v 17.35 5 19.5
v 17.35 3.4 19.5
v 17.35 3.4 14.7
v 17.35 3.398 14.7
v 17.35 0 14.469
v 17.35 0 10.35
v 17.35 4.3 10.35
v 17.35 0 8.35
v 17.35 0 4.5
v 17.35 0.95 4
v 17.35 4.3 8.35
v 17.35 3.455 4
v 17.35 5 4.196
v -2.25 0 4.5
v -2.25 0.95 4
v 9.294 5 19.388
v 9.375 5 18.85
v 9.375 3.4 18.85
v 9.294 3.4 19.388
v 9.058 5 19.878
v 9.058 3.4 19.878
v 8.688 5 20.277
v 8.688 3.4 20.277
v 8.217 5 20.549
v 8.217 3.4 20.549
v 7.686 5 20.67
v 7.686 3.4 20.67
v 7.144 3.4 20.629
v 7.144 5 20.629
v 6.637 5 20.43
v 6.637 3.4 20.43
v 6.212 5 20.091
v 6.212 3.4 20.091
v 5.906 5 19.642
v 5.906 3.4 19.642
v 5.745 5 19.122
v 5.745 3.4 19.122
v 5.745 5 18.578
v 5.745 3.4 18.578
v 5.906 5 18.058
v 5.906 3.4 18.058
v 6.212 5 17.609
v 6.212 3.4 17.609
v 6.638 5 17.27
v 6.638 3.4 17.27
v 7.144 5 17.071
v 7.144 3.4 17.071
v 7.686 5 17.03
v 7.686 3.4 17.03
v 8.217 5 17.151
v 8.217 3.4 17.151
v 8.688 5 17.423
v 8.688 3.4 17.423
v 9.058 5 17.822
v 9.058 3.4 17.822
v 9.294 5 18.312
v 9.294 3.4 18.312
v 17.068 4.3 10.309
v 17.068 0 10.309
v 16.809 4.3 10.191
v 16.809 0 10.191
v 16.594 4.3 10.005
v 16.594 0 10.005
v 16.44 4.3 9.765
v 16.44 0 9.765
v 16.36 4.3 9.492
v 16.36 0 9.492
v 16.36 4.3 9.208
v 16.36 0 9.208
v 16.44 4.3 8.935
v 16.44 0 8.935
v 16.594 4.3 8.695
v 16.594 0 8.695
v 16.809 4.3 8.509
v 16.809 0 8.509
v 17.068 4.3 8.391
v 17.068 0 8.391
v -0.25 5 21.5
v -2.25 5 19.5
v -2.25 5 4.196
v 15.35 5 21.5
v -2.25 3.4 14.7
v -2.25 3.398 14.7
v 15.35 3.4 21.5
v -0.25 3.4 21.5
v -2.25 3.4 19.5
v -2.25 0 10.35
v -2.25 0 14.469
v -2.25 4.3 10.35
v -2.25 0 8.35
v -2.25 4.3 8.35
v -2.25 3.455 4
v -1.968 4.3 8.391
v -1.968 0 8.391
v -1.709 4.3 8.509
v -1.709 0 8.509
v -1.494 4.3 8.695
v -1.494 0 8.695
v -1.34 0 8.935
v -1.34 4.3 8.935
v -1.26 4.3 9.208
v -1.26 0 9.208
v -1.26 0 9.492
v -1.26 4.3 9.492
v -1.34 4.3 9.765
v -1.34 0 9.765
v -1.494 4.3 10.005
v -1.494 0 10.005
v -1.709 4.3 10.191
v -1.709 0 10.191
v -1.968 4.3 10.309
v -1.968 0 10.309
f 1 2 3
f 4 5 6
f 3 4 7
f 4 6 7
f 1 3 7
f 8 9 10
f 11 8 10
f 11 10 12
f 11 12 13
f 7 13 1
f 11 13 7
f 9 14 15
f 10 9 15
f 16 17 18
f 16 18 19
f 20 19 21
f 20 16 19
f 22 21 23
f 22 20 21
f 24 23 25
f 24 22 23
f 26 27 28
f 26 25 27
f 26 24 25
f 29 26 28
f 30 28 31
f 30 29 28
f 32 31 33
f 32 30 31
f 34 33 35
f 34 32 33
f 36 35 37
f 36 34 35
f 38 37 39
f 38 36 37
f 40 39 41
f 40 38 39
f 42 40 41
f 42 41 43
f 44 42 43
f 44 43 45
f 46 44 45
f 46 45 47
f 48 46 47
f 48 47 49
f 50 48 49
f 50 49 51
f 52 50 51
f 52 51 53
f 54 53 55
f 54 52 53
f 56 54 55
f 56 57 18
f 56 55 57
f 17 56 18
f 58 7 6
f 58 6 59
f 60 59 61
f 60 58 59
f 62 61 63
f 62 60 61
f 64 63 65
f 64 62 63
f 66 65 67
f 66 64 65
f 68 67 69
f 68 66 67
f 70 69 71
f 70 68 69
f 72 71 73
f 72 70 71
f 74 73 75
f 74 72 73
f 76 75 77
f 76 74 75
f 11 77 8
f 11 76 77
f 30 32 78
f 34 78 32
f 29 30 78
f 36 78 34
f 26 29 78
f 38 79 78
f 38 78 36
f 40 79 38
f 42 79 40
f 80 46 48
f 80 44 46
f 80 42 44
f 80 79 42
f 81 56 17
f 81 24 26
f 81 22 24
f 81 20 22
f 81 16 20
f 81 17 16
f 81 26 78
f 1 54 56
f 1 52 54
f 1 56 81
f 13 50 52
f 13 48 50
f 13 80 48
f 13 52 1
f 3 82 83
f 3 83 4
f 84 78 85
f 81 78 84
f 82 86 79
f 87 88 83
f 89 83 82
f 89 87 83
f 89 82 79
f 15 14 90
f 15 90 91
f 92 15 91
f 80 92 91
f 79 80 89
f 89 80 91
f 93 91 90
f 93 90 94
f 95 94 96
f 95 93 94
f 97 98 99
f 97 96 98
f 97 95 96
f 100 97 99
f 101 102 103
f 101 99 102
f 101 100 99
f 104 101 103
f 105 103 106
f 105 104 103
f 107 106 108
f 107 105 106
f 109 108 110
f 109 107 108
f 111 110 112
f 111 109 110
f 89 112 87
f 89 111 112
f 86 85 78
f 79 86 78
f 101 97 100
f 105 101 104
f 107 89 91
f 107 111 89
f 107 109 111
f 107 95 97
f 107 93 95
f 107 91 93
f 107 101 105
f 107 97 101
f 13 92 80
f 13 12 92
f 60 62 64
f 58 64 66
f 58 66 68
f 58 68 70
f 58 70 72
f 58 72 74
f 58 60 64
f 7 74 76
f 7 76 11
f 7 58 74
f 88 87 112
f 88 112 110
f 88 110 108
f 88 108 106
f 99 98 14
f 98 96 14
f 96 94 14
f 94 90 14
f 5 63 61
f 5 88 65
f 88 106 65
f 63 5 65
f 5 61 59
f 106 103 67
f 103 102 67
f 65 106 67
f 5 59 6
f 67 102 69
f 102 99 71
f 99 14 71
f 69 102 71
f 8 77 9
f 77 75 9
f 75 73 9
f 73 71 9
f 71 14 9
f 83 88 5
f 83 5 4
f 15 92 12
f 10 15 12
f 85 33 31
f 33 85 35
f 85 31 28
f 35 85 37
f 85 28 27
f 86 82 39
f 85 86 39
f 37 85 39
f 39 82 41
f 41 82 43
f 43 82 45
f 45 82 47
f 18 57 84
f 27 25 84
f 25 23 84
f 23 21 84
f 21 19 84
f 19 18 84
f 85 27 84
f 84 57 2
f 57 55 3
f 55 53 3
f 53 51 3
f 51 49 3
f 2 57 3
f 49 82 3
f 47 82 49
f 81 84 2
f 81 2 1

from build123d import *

# Parameters (mm, degrees)
CYLINDER001_R          = 1
CYLINDER001_DEPTH      = 10
CYLINDER001_ROLL_ANGLE = 90
ARRAY_X_COUNT          = 2
ARRAY_X_PITCH          = 19.6
BOX_W                  = 19.6
BOX_H                  = 5
BOX_DEPTH              = 10.7
CYLINDER_R             = 1.825
CYLINDER_DEPTH         = 10
CYLINDER_ROLL_ANGLE    = 90
BOX001_W               = 19.6
BOX001_H               = 1.6
BOX001_DEPTH           = 17.5
CHAMFER_SIZE           = 2
POCKET_DEPTH           = 50


with BuildPart() as array:
    # Cylinder001 → Cylinder001 (new body)
    with BuildSketch(Plane.XY):
        Circle(CYLINDER001_R)
    extrude(amount=CYLINDER001_DEPTH)


with BuildPart() as array_1:
    # Cylinder001 roll: moved
    add(array.part.rotate(Axis((0, 0, 0), (1, 0, 0)), CYLINDER001_ROLL_ANGLE))


with BuildPart() as array_2:
    # Cylinder001 placement: moved
    add(array_1.part.moved(Location((0, 4.3, 5.35))))

    # Array X: Array ×2


with BuildPart() as array_3:
    add(array_2.part)
    with Locations(*[(i * ARRAY_X_PITCH, 0, 0) for i in range(1, ARRAY_X_COUNT)]):
        add(array_2.part)


with BuildPart() as cubo:
    # Box → Box (new body)
    with BuildSketch(Plane.XY):
        with Locations((9.8, 2.5)):
            Rectangle(BOX_W, BOX_H)
    extrude(amount=BOX_DEPTH)


with BuildPart() as cilindro:
    # Cylinder → Cylinder (new body)
    with BuildSketch(Plane.XY):
        Circle(CYLINDER_R)
    extrude(amount=CYLINDER_DEPTH)


with BuildPart() as cilindro_1:
    # Cylinder roll: moved
    add(cilindro.part.rotate(Axis((0, 0, 0), (1, 0, 0)), CYLINDER_ROLL_ANGLE))


with BuildPart() as cilindro_2:
    # Cylinder placement: moved
    add(cilindro_1.part.moved(Location((9.8, 10, 14.85))))


with BuildPart() as encapsulado:
    # Box001 → Box001 (new body)
    with BuildSketch(Plane(origin=(0, 3.4, 0), x_dir=(1, 0, 0), z_dir=(0, 0, 1))):
        with Locations((9.8, 0.8)):
            Rectangle(BOX001_W, BOX001_H)
    extrude(amount=BOX001_DEPTH)

    # Chamfer
    chamfer_edges = [encapsulado.edges().sort_by_distance(p)[0] for p in [
        (0, 4.2, 17.5),
        (19.6, 4.2, 17.5),
    ]]
    chamfer(chamfer_edges, length=CHAMFER_SIZE)

    # Cut: cut Cilindro
    add(cilindro_2.part, mode=Mode.SUBTRACT)

    # Fusion: union Cubo
    add(cubo.part)

    # Sketch → Pocket (cut, symmetric)
    with BuildSketch(Plane.YZ.offset(19.6)):
        Polygon((3.400024, 10.700153), (-0.022797, 10.708087), (-0.047538, 10.466272), align=None)
        Polygon((-0.28005, 0.647481), (0.962411, -0.006446), (-0.389037, -0.137231), align=None)
        Polygon((3.403737, -0.006446), (5.125743, 0.21153), (5.191135, -0.377004), align=None)
    extrude(amount=POCKET_DEPTH, both=True, mode=Mode.SUBTRACT)

    # Cut001: cut Array
    add(array_3.part, mode=Mode.SUBTRACT)


with BuildPart() as encapsulado_1:
    # Cut001 placement: moved
    add(encapsulado.part.moved(Location((-2.25, 0, 4))))


solid = encapsulado_1.part
